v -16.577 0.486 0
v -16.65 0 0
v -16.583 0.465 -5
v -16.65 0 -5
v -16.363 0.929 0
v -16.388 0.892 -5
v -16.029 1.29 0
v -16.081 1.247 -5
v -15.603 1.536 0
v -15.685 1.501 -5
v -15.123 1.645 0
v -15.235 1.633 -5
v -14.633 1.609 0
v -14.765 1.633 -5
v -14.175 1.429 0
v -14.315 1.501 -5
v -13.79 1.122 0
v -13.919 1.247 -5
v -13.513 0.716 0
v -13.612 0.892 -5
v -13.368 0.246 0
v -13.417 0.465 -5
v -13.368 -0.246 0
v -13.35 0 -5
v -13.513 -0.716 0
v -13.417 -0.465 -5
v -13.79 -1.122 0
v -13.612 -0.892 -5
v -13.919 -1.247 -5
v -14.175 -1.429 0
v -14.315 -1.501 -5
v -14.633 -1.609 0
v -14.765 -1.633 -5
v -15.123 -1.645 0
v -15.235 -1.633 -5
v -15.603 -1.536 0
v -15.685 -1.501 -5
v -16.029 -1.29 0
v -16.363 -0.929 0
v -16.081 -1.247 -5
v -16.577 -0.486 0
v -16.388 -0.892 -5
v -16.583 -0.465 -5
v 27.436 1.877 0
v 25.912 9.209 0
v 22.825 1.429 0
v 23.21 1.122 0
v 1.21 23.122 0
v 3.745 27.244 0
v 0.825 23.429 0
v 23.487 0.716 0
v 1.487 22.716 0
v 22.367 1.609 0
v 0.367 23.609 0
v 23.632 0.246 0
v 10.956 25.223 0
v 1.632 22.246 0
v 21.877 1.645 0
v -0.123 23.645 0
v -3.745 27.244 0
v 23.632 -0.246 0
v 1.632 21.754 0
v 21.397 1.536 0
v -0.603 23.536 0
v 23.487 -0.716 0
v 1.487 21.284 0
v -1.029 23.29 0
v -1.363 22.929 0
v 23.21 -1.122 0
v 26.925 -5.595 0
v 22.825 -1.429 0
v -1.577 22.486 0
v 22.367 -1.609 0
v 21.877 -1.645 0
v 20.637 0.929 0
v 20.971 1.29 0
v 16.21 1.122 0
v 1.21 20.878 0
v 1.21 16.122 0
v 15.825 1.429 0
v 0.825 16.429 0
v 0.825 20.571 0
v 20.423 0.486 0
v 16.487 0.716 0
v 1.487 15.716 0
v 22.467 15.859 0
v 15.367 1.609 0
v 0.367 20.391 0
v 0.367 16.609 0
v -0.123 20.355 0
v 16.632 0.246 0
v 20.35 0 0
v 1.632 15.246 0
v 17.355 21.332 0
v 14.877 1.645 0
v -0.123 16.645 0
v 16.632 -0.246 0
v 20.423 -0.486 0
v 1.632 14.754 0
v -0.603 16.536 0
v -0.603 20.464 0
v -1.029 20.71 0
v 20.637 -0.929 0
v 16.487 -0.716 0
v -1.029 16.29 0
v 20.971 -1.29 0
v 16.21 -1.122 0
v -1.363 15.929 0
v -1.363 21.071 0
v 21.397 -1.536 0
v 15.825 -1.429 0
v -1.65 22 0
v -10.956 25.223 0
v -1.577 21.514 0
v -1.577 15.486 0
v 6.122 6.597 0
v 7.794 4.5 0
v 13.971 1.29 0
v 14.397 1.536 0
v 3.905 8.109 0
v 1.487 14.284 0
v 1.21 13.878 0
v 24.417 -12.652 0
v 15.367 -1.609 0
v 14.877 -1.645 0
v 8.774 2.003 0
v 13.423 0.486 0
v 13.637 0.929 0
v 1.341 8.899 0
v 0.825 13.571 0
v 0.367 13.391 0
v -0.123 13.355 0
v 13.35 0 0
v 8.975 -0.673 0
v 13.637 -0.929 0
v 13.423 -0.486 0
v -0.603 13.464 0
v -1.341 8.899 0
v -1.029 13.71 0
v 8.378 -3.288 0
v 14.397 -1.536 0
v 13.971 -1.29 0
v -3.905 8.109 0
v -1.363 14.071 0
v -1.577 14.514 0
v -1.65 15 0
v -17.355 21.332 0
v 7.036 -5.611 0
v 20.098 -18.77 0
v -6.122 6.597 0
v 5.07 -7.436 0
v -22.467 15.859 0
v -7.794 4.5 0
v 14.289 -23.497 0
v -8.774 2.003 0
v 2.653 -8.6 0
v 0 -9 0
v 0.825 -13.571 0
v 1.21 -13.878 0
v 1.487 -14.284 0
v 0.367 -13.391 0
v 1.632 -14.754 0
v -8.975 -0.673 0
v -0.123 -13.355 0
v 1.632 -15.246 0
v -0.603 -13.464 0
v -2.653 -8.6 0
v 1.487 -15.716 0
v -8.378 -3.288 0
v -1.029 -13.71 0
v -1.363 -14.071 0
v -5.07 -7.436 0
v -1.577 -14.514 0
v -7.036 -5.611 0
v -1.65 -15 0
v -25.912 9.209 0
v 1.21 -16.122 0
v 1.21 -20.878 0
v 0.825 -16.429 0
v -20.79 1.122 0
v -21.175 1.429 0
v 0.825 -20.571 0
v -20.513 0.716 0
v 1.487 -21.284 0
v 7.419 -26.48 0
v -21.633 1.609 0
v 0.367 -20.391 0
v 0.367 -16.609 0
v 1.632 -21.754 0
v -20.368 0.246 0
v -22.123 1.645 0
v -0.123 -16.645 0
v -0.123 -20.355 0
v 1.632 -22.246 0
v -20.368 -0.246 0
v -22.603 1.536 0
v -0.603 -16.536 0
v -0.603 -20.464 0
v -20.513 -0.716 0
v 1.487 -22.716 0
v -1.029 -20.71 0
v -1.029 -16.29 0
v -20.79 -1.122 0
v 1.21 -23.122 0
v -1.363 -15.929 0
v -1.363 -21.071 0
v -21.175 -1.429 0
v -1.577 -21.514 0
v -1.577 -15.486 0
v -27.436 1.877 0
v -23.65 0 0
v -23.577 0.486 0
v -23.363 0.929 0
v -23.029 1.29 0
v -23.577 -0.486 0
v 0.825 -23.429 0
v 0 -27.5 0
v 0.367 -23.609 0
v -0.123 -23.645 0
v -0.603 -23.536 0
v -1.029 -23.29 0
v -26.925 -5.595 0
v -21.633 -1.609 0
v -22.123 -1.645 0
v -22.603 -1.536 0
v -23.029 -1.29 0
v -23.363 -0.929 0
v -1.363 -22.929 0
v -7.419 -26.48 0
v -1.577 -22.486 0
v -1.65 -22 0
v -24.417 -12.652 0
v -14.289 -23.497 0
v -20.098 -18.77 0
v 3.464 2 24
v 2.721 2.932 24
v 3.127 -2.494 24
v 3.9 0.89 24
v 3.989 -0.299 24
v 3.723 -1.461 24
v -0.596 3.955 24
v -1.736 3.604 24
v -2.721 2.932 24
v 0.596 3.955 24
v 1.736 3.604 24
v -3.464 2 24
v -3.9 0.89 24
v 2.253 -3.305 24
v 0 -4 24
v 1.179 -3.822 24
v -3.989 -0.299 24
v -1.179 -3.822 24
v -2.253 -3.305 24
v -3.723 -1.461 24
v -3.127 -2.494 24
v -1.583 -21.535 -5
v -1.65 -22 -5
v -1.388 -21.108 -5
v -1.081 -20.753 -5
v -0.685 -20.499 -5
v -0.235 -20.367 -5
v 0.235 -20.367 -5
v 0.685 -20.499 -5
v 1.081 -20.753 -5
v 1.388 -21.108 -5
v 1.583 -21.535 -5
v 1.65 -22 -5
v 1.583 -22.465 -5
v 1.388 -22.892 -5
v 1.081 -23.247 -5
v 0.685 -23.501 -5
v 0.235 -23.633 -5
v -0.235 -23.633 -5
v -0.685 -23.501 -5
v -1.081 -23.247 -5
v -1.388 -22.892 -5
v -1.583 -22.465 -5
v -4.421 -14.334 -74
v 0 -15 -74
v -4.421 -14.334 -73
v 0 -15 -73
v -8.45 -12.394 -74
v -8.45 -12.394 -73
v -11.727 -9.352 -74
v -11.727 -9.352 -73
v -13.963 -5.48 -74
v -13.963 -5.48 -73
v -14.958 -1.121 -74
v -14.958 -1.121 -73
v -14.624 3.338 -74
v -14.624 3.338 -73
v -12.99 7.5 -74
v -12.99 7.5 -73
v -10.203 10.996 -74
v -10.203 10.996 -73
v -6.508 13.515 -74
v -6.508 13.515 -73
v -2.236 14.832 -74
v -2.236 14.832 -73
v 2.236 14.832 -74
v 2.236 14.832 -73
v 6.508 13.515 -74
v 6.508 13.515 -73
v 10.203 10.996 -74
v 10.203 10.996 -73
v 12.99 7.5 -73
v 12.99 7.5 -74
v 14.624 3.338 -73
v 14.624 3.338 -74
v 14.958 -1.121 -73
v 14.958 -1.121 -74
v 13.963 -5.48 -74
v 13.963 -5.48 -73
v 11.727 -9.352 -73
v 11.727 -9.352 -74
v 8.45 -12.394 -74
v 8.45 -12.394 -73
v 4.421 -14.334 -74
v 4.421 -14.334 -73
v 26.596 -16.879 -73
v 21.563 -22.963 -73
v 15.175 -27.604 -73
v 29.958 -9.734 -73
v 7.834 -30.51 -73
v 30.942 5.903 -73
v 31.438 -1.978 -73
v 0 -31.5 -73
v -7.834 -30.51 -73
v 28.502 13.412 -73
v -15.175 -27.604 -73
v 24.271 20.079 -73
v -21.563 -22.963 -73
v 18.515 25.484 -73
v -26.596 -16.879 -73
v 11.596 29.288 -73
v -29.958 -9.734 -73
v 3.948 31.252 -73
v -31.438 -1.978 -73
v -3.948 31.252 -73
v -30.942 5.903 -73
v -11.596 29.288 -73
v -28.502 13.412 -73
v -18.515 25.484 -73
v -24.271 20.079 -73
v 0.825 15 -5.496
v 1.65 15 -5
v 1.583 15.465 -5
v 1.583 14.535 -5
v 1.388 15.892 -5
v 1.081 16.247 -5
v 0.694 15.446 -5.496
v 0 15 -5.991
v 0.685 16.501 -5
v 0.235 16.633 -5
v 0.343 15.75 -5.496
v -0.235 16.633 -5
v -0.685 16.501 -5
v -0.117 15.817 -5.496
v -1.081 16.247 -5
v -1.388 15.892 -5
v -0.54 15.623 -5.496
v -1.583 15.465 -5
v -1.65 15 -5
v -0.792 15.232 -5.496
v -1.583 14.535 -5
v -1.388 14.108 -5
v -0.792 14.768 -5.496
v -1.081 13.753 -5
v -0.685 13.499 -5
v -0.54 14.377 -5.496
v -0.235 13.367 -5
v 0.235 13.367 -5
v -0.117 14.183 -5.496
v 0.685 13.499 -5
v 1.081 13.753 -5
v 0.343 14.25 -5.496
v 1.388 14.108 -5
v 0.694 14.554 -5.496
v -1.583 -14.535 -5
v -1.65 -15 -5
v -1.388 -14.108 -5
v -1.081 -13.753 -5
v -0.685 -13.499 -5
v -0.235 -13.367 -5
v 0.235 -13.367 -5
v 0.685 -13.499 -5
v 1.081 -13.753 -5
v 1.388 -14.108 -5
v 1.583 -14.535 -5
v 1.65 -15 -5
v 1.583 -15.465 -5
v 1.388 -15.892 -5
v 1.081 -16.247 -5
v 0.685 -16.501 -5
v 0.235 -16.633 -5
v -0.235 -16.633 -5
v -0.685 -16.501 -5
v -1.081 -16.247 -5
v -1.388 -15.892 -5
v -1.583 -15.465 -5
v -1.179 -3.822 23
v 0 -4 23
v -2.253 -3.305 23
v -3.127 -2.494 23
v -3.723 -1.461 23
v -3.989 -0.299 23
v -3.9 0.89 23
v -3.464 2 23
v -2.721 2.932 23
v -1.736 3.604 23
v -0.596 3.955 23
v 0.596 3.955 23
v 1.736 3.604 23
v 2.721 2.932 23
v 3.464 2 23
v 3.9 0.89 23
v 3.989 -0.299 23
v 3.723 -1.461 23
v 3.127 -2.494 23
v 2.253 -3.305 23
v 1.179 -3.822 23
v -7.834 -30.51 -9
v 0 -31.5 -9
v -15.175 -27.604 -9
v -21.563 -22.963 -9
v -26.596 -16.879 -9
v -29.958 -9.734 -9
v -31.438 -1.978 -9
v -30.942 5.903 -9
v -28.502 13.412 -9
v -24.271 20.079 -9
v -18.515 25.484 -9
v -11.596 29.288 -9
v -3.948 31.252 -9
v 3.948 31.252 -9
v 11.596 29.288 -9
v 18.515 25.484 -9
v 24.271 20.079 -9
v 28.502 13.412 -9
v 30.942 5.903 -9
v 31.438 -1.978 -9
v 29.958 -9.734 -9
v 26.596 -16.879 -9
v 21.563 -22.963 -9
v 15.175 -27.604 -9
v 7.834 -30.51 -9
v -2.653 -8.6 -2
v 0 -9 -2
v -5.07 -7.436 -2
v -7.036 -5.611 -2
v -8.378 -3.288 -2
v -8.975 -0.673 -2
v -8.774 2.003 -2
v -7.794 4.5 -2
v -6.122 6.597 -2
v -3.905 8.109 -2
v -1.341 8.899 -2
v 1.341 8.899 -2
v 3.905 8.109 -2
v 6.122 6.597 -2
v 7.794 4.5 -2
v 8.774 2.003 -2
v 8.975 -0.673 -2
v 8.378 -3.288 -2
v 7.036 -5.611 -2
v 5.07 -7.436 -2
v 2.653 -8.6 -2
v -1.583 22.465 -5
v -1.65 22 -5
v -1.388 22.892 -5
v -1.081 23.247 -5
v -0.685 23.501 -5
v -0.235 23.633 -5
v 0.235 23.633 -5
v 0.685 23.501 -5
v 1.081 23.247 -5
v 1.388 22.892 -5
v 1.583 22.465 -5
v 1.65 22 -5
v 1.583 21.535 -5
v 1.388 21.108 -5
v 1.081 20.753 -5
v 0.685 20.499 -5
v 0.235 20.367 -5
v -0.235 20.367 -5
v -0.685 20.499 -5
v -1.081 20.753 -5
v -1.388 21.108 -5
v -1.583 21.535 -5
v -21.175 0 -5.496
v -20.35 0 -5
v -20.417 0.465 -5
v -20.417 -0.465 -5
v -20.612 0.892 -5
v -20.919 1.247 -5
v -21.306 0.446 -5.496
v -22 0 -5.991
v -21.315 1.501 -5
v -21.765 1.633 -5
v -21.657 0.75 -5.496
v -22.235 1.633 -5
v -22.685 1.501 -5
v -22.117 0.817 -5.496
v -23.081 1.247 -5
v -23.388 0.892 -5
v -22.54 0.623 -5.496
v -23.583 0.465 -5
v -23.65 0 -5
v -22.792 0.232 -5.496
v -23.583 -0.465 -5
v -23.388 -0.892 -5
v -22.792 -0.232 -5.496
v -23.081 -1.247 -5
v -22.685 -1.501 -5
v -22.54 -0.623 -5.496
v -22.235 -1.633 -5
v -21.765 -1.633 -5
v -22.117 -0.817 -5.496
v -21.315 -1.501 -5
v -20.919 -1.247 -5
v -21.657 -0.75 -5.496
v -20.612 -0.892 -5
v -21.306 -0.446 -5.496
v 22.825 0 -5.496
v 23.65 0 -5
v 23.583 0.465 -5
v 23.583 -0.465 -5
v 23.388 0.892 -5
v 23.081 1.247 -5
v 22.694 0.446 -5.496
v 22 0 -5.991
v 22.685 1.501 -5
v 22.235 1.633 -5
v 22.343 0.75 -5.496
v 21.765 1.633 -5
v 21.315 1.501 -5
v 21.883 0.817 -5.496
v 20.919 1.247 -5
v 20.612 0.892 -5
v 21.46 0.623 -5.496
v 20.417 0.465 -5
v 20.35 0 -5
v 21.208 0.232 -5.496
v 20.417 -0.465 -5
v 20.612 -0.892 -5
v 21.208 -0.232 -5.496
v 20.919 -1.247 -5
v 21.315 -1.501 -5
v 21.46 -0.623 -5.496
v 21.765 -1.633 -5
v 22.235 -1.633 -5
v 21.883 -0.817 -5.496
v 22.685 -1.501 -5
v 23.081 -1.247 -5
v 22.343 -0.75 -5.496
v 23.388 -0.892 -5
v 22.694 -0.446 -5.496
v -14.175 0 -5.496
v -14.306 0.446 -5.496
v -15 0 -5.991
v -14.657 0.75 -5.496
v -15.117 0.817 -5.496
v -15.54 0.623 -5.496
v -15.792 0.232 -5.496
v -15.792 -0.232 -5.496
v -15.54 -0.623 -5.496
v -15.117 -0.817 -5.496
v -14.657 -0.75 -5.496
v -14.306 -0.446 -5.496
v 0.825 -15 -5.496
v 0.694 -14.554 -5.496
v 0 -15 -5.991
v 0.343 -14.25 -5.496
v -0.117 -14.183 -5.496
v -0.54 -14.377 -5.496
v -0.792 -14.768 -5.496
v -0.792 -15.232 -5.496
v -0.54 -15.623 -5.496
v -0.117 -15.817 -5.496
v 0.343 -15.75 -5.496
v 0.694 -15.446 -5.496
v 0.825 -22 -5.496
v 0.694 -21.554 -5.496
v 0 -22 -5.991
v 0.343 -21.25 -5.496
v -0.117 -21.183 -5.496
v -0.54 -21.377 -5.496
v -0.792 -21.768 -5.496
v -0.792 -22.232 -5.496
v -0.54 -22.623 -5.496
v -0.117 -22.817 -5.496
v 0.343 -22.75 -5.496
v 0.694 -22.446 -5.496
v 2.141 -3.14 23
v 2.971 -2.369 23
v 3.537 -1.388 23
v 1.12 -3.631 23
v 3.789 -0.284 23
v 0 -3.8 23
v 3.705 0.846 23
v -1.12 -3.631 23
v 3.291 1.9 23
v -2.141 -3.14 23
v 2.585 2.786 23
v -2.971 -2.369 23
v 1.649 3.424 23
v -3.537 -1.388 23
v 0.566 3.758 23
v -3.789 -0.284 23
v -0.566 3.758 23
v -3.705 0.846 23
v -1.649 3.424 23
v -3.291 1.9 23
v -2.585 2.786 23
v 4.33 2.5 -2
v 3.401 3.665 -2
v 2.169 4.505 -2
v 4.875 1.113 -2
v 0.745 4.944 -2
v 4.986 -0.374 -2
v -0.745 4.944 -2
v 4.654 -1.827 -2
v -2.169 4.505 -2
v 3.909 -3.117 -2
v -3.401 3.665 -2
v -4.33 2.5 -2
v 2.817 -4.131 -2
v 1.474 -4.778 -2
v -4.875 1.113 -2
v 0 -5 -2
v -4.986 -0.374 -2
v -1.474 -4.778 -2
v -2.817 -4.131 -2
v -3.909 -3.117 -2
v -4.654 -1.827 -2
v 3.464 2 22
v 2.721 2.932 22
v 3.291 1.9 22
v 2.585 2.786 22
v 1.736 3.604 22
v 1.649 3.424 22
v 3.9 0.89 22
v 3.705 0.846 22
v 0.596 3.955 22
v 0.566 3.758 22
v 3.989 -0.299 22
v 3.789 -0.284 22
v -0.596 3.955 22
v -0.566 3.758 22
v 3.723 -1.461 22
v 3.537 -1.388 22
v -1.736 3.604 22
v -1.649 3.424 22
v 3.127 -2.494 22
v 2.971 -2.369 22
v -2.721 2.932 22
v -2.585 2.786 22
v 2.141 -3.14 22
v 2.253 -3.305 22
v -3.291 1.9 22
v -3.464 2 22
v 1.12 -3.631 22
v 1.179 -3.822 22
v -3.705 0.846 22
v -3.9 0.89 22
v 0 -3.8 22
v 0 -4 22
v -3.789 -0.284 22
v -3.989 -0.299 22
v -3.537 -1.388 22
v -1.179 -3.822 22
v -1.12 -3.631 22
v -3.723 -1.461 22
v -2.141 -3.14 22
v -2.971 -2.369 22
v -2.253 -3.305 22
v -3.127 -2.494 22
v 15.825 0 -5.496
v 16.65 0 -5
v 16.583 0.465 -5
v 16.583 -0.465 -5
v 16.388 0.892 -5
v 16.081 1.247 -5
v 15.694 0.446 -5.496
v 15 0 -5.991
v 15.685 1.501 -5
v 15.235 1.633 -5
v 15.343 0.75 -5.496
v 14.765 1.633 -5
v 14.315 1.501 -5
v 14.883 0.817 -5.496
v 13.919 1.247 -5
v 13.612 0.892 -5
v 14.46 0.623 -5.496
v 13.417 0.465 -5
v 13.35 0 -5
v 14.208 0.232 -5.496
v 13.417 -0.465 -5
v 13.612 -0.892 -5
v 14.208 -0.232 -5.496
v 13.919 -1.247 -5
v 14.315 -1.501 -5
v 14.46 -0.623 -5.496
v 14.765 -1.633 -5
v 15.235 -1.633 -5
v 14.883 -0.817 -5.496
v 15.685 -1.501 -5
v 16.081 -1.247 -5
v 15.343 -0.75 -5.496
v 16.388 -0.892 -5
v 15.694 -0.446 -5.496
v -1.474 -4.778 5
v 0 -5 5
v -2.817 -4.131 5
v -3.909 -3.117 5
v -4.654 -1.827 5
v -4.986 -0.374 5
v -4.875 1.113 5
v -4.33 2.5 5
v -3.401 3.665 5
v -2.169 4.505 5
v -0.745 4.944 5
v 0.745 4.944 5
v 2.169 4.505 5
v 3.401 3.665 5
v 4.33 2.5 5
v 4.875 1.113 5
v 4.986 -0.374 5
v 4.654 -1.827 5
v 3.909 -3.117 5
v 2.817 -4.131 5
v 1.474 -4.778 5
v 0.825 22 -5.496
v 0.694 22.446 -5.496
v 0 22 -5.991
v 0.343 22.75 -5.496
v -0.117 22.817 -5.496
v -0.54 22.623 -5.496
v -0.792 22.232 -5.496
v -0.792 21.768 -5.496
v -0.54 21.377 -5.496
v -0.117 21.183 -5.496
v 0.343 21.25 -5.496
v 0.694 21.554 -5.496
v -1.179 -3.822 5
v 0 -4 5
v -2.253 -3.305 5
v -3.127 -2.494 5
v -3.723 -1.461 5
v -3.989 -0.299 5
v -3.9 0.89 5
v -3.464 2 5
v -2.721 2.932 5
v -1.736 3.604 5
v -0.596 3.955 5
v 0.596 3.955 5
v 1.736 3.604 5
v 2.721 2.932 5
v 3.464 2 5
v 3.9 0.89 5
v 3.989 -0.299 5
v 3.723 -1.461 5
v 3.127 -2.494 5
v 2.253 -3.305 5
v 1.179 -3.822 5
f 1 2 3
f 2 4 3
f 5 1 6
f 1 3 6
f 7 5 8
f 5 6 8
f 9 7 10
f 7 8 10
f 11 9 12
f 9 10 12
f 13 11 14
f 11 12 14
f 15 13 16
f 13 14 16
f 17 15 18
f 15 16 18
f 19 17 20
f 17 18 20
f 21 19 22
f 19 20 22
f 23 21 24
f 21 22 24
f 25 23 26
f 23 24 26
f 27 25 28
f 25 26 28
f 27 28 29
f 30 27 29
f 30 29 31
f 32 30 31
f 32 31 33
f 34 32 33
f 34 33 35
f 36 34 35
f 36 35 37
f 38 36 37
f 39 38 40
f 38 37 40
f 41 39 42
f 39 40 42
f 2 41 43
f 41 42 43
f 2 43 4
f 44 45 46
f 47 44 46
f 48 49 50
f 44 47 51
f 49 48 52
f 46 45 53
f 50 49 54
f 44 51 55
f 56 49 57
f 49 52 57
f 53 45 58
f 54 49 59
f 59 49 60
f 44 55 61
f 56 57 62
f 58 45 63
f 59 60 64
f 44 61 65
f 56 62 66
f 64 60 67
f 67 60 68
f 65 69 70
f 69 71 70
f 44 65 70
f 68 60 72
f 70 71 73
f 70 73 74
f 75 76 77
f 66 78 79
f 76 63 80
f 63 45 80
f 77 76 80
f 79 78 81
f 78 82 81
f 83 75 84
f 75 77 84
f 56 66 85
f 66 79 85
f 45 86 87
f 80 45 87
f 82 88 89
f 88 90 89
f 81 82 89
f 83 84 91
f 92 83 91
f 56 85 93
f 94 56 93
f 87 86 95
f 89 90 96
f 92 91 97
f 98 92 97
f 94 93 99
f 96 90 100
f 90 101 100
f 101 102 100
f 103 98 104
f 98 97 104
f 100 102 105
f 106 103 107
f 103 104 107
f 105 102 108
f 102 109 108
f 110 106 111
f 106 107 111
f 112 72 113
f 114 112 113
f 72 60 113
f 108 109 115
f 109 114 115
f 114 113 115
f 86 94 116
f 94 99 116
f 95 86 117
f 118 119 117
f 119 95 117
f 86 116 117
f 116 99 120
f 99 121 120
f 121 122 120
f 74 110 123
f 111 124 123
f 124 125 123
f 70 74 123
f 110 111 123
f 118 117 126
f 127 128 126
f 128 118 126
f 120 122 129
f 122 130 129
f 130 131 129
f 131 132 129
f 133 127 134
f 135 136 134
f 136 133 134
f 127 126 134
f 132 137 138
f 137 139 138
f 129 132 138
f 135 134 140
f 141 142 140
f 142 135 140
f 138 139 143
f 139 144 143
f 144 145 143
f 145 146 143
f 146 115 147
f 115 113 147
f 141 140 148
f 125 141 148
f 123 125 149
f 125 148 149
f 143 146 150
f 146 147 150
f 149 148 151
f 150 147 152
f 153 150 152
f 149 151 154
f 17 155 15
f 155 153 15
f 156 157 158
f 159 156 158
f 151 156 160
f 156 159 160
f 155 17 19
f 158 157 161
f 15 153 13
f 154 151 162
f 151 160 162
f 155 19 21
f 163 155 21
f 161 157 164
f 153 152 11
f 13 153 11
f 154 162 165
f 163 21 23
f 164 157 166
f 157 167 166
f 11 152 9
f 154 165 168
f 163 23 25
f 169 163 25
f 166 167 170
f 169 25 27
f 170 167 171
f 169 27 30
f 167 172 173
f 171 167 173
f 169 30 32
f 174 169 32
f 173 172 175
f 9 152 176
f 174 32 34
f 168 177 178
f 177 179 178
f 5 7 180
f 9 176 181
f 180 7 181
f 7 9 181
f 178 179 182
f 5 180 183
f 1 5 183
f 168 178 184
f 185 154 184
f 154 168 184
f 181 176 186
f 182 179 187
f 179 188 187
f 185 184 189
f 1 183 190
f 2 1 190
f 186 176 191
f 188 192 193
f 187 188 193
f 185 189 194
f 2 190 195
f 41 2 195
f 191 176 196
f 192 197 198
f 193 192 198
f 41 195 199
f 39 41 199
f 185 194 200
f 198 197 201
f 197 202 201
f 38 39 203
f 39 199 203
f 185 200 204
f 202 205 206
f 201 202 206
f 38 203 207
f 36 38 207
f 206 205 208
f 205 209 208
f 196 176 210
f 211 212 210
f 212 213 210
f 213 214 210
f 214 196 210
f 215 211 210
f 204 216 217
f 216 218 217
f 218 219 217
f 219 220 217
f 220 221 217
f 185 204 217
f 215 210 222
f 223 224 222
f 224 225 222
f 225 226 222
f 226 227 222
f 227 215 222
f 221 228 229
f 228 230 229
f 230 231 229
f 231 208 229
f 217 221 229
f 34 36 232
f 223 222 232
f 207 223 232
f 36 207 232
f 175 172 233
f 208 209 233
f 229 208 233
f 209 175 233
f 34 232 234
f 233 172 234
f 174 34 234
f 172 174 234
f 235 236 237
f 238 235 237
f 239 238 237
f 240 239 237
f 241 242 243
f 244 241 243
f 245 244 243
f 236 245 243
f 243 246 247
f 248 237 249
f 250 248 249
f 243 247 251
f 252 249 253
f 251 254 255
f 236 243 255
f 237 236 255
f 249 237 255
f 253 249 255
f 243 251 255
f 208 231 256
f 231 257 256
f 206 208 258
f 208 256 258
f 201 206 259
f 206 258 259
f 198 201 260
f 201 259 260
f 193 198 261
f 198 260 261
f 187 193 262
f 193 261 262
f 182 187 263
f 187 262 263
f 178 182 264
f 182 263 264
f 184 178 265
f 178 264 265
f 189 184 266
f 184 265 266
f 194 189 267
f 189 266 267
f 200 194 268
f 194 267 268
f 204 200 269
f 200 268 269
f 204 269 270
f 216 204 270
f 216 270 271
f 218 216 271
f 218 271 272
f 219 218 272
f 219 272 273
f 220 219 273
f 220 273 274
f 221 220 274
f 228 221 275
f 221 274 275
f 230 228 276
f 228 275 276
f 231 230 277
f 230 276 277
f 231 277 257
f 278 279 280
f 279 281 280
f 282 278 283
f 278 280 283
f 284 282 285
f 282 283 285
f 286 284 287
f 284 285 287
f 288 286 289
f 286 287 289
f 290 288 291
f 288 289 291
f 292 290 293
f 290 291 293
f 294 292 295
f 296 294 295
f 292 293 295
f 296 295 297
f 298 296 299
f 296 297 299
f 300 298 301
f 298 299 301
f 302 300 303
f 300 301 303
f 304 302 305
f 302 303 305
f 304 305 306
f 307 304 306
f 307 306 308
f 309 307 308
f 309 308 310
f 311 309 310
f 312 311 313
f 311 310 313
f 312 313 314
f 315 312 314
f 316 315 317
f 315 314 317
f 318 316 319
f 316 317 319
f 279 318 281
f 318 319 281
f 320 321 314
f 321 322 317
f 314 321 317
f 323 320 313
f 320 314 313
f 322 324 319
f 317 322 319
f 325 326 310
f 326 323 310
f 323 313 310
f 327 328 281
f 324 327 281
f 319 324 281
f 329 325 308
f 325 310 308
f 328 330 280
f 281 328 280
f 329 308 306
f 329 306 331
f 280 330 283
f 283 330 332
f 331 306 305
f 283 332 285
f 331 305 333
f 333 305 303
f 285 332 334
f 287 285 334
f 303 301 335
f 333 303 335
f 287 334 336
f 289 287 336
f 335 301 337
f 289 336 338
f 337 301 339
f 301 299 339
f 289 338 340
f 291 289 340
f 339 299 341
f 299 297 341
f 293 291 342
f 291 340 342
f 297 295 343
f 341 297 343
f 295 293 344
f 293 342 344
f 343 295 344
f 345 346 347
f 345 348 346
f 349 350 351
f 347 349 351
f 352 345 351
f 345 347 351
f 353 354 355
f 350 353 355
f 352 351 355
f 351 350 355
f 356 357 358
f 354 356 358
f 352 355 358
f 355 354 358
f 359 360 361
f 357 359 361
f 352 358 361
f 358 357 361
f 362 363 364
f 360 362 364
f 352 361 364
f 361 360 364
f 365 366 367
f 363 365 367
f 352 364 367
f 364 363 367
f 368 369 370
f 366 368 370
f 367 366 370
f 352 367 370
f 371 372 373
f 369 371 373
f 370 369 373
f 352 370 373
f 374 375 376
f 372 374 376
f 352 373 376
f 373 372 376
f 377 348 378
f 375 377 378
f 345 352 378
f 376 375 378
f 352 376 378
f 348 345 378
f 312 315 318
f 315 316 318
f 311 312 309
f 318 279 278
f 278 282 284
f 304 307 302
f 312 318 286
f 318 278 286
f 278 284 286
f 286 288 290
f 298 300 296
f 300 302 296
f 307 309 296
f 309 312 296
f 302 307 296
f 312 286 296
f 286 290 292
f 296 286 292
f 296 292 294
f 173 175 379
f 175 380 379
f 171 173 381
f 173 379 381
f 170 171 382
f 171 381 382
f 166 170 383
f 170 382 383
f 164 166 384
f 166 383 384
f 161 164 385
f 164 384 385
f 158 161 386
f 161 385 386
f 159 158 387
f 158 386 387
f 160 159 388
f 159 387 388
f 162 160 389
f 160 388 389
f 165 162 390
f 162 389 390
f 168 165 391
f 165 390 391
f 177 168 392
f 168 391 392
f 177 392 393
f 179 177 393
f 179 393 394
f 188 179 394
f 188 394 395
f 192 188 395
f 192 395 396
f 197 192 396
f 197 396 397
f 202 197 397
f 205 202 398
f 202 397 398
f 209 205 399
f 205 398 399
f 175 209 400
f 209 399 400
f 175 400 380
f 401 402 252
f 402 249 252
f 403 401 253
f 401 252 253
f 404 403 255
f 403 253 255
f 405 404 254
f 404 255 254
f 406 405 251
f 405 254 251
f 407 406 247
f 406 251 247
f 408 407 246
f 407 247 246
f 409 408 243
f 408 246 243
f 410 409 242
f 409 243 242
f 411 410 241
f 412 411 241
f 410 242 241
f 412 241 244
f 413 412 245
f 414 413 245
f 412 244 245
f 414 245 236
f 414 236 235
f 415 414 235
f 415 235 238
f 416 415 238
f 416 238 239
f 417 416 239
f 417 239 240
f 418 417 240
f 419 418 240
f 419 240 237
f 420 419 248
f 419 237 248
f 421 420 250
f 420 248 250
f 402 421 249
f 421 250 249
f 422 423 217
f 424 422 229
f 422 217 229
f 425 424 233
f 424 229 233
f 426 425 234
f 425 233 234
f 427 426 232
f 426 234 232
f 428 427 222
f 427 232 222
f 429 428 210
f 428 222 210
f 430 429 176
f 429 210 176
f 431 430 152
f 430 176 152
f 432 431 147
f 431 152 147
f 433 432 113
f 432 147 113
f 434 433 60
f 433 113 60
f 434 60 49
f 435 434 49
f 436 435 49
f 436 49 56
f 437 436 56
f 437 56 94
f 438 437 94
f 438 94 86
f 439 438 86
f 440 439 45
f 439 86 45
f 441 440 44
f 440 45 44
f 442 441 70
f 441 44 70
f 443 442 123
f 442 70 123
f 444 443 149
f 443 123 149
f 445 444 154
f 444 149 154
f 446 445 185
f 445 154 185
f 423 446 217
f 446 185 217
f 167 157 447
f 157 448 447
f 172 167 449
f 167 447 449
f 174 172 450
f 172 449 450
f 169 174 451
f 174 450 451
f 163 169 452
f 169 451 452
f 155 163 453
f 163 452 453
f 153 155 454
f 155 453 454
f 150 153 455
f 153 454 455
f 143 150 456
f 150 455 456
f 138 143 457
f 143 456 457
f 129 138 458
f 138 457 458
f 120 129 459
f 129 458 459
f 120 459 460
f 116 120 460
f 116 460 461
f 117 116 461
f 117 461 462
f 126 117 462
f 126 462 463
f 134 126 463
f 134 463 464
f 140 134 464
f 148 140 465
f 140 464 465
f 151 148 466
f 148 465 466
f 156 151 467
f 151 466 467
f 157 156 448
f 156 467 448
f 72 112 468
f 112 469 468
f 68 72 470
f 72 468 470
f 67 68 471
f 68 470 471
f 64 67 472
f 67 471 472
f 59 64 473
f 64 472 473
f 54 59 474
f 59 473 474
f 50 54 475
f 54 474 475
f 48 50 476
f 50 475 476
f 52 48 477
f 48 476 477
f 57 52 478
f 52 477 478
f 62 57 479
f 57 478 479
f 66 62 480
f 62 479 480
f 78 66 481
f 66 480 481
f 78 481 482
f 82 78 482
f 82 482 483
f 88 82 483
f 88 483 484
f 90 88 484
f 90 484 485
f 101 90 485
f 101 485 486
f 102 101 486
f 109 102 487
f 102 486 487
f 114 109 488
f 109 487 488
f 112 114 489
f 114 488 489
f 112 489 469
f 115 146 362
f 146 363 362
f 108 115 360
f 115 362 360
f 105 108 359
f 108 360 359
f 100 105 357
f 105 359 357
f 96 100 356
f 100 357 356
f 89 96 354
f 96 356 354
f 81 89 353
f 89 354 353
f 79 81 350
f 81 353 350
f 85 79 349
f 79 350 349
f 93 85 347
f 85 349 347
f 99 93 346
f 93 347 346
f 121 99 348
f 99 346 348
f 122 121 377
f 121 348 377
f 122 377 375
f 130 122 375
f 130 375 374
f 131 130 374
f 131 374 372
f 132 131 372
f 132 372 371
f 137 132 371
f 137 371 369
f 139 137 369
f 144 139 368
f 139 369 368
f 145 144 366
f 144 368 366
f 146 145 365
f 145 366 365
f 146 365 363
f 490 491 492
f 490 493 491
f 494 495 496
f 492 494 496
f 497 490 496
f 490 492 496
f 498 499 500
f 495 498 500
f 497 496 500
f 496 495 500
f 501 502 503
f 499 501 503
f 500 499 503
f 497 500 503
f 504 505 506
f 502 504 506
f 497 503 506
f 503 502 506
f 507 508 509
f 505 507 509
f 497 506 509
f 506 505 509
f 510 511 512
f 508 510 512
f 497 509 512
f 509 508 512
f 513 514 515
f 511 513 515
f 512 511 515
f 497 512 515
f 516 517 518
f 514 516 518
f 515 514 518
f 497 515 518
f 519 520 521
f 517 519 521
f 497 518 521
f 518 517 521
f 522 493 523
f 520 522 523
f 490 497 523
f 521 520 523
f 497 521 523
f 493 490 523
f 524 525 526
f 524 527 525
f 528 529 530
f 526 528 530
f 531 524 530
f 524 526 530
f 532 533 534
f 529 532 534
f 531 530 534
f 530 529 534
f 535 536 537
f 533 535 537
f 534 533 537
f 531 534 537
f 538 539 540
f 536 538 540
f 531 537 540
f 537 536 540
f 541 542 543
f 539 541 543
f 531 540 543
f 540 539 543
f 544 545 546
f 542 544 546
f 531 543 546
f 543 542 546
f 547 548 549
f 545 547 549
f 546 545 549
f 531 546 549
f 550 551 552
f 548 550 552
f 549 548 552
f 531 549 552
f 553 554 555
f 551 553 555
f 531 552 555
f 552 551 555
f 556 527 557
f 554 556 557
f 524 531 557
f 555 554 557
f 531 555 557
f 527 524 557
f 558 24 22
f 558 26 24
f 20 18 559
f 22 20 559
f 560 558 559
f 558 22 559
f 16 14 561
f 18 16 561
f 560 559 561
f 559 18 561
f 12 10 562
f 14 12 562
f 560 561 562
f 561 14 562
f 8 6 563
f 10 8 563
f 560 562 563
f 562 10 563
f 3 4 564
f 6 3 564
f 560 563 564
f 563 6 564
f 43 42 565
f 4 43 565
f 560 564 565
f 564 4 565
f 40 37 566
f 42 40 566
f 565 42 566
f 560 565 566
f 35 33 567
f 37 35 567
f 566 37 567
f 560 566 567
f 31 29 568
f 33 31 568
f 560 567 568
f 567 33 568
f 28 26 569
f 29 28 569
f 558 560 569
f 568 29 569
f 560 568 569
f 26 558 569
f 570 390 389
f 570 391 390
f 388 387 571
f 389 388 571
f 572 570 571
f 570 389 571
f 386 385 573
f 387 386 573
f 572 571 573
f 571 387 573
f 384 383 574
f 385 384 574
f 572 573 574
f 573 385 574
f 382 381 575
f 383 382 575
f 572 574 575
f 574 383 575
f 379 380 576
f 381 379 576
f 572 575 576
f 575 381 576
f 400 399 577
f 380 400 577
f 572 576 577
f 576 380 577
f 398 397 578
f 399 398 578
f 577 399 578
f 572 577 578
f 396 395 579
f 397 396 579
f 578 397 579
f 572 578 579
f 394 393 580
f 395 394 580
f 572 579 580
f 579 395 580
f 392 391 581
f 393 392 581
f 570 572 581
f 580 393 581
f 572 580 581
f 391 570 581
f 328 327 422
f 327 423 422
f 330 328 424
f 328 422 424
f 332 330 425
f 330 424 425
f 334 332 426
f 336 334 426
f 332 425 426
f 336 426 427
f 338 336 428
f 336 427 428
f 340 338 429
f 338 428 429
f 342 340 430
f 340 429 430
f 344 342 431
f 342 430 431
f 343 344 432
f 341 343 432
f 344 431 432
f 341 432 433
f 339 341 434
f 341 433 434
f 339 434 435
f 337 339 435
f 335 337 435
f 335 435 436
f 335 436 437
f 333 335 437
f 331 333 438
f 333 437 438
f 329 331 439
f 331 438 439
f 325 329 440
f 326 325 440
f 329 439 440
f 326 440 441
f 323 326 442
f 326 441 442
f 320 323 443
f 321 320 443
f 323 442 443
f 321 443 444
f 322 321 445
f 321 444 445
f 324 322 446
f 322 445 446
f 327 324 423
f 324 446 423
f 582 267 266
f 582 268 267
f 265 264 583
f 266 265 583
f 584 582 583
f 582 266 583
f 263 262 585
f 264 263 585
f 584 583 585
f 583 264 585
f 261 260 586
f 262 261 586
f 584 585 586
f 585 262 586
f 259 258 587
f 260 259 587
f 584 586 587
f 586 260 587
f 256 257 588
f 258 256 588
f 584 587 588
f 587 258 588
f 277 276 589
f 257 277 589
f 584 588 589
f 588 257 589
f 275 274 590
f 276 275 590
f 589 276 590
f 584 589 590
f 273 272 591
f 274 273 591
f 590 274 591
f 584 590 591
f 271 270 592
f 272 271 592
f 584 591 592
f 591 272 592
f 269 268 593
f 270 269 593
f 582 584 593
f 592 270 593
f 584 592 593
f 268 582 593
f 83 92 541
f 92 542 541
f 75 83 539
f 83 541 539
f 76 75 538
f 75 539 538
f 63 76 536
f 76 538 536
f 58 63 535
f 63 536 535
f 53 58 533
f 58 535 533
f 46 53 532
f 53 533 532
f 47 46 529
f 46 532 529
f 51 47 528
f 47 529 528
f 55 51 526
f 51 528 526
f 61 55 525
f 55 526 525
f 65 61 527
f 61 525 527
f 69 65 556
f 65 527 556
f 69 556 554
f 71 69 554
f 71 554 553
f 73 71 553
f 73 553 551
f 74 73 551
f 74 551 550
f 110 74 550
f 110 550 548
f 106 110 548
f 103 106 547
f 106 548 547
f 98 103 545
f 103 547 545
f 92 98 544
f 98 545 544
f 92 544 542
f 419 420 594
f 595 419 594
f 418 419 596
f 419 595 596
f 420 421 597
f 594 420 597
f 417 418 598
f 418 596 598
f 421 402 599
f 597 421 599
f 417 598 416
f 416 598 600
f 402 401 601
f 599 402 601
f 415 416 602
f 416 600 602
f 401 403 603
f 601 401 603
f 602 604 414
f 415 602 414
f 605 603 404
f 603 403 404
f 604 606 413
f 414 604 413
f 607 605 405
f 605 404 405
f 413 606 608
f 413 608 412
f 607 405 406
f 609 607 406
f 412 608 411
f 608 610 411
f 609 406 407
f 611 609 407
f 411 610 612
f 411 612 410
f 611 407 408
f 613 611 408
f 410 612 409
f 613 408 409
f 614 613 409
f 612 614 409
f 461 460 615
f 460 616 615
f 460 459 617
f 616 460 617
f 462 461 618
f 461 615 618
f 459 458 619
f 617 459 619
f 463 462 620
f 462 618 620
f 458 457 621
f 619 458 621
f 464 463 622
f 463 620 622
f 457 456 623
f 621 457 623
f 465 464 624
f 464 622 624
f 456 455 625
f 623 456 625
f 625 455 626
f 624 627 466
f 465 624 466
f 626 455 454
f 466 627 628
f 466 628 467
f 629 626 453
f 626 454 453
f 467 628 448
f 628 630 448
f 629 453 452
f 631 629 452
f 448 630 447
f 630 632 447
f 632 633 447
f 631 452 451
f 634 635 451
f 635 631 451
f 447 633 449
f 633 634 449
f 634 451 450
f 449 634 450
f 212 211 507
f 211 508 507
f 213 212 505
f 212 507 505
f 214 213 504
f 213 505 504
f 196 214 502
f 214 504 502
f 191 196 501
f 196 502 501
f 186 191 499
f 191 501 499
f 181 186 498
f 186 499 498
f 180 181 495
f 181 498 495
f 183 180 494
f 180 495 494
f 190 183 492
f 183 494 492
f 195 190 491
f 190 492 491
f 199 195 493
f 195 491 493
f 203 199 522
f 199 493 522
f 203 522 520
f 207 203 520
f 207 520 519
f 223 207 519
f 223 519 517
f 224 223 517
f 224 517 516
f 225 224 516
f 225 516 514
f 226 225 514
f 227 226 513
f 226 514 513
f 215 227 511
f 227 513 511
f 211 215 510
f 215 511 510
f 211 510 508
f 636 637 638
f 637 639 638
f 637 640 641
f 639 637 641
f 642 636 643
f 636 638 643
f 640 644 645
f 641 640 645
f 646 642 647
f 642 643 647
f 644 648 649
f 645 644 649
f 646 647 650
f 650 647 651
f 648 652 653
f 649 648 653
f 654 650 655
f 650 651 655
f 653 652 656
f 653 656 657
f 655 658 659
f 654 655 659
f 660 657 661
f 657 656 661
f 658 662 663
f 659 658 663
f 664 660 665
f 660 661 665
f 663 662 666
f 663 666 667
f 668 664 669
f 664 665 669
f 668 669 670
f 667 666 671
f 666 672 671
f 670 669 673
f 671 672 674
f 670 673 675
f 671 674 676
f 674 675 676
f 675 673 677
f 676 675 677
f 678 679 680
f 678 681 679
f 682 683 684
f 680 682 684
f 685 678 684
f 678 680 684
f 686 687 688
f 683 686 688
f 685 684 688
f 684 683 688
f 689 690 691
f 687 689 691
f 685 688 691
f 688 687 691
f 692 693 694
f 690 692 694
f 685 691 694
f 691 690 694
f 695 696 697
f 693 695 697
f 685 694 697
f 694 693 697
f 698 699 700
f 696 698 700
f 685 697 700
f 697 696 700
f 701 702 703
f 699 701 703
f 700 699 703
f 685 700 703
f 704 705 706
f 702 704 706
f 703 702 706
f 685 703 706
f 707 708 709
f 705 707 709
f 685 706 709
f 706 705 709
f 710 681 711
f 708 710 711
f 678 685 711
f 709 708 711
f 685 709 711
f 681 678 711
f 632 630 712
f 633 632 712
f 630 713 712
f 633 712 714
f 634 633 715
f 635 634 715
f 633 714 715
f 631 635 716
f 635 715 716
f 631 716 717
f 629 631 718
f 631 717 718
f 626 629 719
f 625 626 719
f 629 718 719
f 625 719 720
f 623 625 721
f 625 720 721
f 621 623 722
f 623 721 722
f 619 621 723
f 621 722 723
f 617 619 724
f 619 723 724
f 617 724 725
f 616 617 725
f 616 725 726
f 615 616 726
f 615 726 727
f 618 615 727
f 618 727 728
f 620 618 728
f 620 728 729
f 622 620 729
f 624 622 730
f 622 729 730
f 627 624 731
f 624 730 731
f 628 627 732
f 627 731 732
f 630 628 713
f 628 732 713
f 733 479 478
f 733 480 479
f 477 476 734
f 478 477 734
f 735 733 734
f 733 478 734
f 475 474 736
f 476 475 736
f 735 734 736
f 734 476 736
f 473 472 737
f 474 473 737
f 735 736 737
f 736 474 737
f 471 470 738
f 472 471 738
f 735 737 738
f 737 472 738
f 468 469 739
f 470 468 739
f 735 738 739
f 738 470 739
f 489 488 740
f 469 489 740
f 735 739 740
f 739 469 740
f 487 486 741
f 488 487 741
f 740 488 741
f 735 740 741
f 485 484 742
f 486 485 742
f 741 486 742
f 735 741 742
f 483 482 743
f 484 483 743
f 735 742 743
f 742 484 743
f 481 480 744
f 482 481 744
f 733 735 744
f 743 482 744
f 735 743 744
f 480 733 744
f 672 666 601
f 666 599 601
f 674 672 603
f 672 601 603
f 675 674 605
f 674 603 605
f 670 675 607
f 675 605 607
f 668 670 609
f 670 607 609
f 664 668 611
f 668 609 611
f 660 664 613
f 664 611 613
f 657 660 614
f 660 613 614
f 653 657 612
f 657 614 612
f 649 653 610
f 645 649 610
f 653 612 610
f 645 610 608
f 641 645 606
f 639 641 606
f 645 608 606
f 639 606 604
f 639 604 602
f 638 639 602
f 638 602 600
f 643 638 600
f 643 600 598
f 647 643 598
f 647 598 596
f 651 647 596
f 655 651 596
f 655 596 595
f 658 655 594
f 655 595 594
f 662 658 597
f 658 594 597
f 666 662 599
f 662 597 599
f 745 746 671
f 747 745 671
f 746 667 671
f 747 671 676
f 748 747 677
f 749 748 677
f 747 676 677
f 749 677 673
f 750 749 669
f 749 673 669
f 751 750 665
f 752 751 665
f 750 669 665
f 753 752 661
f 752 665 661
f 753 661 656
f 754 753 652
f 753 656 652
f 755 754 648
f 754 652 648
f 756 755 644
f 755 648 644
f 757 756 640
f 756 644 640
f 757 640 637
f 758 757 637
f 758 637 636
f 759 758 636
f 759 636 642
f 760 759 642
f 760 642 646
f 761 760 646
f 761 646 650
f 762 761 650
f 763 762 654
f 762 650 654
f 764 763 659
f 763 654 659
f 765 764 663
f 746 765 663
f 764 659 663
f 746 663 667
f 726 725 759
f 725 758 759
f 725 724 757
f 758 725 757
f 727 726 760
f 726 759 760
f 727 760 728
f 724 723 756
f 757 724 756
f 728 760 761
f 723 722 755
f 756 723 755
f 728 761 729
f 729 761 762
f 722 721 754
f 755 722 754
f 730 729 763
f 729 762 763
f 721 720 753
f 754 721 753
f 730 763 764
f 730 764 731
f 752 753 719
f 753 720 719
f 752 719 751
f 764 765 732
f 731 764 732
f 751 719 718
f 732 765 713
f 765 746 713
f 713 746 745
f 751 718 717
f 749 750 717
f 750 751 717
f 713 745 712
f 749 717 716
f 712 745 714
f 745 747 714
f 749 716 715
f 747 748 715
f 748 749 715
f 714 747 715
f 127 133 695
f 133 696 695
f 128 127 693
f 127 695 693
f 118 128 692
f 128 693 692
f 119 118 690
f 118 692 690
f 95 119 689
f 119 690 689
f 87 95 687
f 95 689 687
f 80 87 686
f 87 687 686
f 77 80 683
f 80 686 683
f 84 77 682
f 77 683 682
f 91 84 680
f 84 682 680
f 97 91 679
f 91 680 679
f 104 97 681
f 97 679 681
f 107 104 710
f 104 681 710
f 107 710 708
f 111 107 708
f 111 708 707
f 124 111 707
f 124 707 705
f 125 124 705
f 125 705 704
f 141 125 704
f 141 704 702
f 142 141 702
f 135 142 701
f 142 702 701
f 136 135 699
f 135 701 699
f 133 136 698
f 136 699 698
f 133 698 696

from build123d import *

# Parameters (mm, degrees)
TAP_DRILL_FOR_M4X0_7_TAP1_D     = 3.3
TAP_DRILL_FOR_M4X0_7_TAP1_DEPTH = 5
TAP_DRILL_FOR_M4X0_7_TAP1_TIP   = 0.991420021


with BuildPart() as part:
    # Sketch2 → Revolve1 (revolve)
    with BuildSketch(Plane(origin=(0, 0, 0), x_dir=(0, 0, -1), z_dir=(1, 0, 0)), mode=Mode.PRIVATE) as revolve1_sk:
        Polygon((2, 0), (2, 5), (-5, 5), (-5, 4), (-22, 4), (-22, 3.8), (-23, 3.8), (-23, 4), (-24, 4), (-24, 0), align=None)
        Polygon((2, 9), (2, 0), (74, 0), (74, 15), (73, 15), (73, 31.5), (9, 31.5), (0, 27.5), (0, 9), align=None)
    revolve(revolve1_sk.sketch.rotate(Axis((0, 0, -2), (0, 0, -1)), 180), axis=Axis((0, 0, -2), (0, 0, -1)))

    # Tap Drill for M4x0.7 Tap1
    with Locations(Plane(origin=(0, 22, 0), x_dir=(1, 0, 0), z_dir=(0, 0, 1))):
        with Locations((0, 0), (0, -7), (15, -22), (22, -22), (0, -37), (0, -44), (-15, -22), (-22, -22)):
            Hole(TAP_DRILL_FOR_M4X0_7_TAP1_D / 2, depth=TAP_DRILL_FOR_M4X0_7_TAP1_DEPTH)
            with Locations((0, 0, -(TAP_DRILL_FOR_M4X0_7_TAP1_DEPTH + TAP_DRILL_FOR_M4X0_7_TAP1_TIP / 2))):  # 118° drill point
                Cone(0, TAP_DRILL_FOR_M4X0_7_TAP1_D / 2, TAP_DRILL_FOR_M4X0_7_TAP1_TIP, mode=Mode.SUBTRACT)


solid = part.part
